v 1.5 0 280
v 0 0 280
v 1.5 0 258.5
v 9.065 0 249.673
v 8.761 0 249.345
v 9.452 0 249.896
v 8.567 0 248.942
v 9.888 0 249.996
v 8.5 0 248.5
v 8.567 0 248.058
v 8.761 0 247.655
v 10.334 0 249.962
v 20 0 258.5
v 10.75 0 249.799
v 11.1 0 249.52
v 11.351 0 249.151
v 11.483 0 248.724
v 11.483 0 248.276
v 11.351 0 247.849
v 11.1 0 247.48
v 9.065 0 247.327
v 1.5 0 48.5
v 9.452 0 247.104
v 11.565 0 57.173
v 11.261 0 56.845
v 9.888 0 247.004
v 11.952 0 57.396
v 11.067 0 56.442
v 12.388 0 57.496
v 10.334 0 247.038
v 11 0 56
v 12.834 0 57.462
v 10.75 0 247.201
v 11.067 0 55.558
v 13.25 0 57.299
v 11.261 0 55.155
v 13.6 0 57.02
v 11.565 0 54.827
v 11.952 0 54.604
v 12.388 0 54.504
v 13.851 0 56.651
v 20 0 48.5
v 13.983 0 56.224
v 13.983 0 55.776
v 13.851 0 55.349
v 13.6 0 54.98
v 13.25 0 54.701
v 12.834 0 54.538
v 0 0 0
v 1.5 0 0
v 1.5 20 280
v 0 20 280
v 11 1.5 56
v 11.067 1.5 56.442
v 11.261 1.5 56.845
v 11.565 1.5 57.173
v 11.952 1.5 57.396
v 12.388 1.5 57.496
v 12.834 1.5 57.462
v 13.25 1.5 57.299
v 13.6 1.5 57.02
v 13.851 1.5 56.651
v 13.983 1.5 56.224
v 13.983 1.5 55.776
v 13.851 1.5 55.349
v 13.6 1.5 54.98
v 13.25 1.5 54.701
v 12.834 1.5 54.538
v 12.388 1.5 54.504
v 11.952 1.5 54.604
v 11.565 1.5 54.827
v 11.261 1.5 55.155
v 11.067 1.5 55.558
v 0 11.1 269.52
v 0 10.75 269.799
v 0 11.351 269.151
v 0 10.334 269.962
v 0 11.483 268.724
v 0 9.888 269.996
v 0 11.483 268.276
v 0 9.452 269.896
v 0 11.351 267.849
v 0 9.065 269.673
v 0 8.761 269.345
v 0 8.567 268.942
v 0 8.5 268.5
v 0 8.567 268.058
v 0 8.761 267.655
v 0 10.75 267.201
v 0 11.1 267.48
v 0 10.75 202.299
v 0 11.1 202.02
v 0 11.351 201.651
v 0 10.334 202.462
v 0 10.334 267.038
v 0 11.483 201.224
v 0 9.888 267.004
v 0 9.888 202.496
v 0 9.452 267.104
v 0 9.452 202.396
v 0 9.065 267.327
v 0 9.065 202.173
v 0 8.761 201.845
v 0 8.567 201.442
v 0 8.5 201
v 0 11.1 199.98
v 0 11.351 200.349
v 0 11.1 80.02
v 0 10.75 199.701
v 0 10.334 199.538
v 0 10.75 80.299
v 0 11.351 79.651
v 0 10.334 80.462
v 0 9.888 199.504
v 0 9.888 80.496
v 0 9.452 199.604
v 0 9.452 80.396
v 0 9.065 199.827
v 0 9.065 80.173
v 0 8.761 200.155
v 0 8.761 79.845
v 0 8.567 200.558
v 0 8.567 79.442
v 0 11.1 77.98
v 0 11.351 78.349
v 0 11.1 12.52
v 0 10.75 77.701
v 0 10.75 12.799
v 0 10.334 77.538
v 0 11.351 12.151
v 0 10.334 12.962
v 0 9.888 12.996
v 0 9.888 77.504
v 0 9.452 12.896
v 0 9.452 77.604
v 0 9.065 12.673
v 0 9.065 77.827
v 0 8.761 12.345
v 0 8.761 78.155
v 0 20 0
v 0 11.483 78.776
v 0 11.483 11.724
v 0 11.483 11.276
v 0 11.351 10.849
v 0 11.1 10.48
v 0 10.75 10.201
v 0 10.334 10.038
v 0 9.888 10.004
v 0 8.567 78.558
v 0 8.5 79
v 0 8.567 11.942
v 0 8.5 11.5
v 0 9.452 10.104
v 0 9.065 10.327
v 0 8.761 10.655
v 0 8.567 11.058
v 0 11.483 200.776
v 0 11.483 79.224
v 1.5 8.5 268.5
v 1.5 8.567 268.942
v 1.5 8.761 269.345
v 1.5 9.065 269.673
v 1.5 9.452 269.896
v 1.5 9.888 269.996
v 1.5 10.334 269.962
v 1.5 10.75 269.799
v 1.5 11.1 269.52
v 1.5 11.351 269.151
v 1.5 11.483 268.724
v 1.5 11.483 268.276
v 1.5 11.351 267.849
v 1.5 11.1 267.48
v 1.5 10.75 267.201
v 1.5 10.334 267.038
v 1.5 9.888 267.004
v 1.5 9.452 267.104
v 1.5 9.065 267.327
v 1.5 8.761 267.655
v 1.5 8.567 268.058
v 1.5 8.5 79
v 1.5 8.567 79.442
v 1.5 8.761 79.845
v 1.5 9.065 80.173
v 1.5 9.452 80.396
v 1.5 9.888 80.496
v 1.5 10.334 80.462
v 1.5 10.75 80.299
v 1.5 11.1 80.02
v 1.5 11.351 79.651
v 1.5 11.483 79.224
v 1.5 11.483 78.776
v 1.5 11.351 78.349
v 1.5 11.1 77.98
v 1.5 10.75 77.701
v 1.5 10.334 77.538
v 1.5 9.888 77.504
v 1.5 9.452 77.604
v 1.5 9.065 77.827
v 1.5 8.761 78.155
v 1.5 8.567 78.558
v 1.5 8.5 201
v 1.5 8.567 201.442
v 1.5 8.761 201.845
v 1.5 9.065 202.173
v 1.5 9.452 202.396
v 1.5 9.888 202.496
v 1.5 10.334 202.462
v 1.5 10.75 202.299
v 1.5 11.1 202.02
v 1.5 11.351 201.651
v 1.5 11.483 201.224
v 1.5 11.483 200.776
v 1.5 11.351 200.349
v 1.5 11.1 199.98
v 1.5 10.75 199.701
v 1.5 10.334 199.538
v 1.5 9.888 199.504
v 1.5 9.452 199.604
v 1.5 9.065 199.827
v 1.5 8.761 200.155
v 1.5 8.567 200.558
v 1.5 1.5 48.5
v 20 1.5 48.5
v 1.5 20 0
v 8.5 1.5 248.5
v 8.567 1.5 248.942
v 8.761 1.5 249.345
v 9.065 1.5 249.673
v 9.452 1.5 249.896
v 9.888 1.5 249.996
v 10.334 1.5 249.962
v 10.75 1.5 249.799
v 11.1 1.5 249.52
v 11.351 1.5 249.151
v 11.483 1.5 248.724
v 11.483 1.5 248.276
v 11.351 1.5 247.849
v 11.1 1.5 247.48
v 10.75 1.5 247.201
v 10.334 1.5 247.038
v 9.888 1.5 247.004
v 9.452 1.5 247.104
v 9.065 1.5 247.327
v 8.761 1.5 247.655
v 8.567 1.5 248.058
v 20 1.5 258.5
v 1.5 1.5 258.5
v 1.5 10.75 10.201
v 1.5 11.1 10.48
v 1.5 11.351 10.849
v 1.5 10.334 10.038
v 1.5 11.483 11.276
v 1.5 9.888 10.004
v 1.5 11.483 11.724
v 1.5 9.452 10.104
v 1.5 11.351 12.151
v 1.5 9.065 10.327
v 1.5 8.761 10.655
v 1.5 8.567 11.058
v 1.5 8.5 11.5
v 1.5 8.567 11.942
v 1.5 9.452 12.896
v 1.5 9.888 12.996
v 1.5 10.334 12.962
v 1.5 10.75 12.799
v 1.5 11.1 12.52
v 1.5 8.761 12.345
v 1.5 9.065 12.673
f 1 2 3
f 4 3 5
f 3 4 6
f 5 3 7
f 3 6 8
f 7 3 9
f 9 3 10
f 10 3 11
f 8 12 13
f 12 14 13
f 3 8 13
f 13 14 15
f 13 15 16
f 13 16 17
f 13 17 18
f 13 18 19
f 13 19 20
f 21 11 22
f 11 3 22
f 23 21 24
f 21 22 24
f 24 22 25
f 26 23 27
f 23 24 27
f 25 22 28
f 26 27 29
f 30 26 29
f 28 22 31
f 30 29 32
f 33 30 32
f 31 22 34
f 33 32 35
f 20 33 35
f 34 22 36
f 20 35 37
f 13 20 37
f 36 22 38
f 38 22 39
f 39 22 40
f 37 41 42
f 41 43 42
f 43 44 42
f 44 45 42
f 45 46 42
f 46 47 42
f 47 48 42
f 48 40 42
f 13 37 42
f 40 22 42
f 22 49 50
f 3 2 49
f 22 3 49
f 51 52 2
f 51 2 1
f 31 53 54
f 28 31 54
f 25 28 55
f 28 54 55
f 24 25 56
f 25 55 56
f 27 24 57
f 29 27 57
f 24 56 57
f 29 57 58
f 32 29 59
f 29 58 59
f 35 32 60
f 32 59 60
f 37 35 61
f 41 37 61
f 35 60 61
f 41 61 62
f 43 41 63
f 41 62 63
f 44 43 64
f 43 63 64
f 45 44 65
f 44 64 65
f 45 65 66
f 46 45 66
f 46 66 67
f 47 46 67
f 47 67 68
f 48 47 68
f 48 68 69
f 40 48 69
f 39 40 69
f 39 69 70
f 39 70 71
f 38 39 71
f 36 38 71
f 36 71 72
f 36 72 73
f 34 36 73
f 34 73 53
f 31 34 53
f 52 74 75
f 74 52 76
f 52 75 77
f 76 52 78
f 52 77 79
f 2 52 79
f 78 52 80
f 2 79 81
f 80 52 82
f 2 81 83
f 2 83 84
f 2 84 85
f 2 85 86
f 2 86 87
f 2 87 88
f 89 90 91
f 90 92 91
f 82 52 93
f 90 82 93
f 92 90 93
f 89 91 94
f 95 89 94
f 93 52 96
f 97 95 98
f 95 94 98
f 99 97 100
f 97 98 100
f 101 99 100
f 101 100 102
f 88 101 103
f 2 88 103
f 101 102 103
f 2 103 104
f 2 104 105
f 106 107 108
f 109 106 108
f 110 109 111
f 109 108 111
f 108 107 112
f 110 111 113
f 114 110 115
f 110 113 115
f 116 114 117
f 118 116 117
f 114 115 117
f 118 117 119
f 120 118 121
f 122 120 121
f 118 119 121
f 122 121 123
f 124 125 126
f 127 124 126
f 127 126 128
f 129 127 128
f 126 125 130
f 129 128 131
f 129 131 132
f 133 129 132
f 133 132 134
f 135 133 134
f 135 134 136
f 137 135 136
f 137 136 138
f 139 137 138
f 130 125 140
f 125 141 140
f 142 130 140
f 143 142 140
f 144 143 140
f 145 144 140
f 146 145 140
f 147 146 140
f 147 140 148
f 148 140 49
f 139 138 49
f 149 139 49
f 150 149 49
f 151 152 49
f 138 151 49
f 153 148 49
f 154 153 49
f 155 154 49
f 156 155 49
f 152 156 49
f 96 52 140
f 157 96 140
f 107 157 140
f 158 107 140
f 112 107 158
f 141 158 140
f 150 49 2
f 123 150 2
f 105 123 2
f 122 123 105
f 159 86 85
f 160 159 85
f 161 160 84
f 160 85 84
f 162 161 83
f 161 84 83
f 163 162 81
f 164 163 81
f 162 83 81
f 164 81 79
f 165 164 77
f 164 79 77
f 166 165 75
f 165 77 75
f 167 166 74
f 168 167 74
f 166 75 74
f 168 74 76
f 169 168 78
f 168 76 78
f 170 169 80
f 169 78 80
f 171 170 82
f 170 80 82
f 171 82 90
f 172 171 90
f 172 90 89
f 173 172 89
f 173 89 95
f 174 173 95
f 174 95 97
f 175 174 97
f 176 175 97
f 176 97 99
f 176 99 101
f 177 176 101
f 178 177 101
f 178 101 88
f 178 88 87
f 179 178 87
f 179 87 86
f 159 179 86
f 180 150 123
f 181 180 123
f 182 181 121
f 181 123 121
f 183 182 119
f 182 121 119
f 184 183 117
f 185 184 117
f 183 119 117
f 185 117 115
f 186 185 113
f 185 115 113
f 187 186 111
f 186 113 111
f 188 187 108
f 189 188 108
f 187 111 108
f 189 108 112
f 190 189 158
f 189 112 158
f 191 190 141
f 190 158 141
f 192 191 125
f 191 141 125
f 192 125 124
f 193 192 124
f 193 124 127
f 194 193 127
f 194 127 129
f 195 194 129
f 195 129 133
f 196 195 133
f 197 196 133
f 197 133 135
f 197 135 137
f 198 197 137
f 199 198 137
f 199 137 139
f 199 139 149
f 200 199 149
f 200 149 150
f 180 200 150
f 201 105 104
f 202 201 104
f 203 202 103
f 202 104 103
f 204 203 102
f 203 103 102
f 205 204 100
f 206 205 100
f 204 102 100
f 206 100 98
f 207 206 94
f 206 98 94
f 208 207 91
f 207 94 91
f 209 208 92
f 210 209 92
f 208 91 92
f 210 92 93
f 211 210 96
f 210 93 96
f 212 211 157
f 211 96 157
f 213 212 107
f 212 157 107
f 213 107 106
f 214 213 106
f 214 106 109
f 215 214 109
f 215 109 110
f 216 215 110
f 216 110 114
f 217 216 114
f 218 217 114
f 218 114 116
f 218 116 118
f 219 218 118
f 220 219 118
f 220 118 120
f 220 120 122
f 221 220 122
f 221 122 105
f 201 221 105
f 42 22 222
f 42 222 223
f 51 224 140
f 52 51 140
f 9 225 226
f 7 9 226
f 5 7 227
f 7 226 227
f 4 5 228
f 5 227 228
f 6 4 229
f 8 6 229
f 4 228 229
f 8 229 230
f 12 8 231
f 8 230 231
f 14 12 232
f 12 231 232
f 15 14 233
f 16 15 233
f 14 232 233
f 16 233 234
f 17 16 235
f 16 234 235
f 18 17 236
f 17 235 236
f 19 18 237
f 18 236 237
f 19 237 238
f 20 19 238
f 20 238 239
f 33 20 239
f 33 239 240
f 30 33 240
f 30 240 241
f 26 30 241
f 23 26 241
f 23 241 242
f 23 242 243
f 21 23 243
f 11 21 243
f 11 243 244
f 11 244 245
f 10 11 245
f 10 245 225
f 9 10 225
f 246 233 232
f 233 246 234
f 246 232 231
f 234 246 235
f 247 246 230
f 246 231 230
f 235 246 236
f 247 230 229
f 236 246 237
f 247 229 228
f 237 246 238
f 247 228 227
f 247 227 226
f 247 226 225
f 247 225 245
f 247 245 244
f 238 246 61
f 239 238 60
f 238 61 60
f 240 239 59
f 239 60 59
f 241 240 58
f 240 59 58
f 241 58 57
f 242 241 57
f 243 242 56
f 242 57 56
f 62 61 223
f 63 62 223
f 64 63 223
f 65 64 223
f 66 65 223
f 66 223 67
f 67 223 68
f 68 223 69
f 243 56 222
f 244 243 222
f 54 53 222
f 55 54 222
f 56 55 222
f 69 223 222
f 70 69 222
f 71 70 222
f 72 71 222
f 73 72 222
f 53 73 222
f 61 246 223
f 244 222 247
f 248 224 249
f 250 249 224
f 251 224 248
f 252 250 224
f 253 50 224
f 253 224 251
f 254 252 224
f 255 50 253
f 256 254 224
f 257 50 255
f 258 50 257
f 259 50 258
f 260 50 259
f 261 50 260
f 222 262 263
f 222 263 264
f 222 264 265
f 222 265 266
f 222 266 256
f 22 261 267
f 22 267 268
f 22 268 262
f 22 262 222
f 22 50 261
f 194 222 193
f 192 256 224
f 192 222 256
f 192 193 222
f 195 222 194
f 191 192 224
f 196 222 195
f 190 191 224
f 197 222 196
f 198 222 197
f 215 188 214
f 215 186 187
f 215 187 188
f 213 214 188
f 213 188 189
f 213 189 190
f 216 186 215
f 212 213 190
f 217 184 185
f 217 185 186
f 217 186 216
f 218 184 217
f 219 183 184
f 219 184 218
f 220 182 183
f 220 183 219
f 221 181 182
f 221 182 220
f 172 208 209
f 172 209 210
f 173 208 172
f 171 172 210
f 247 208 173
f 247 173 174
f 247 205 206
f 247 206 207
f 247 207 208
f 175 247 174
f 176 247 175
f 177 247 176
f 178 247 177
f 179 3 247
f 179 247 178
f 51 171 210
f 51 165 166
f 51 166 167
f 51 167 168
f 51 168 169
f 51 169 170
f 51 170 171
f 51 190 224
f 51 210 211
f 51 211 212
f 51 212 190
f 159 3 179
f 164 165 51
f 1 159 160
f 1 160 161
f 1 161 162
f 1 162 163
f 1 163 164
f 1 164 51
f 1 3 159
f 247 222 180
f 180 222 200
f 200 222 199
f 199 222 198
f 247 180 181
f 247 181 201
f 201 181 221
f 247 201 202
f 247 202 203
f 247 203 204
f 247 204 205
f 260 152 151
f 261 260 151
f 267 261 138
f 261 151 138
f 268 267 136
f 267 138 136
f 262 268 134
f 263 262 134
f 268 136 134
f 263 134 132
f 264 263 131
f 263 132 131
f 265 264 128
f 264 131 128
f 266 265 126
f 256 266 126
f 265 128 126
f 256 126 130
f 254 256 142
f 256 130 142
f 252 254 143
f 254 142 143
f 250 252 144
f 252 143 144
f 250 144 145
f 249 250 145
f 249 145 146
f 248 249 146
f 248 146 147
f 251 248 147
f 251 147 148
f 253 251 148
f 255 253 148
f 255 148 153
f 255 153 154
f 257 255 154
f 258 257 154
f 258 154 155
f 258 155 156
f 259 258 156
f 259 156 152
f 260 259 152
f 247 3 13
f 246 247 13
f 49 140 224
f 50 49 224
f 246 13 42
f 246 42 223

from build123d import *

# Parameters (mm, degrees)
EXTRUSION1_DEPTH = 280
ESQUISSE2_R      = 1.5
EXTRUSION2_DEPTH = 282.322324034
ESQUISSE3_R      = 1.5
EXTRUSION3_DEPTH = 10
ESQUISSE4_W      = 18.5
ESQUISSE4_H      = 48.5
ESQUISSE4_H_2    = 21.5
EXTRUSION4_DEPTH = 1.5


with BuildPart() as part:
    # Esquisse1 → Extrusion1 (new body)
    with BuildSketch(Plane.XY):
        Polygon((0, 0), (20, 0), (20, 1.5), (1.5, 1.5), (1.5, 20), (0, 20), align=None)
    extrude(amount=EXTRUSION1_DEPTH)

    # Esquisse2 → Extrusion2 (cut, through all)
    with BuildSketch(Plane(origin=(0, 1.5, 0), x_dir=(1, 0, 0), z_dir=(0, 1, 0))):
        with Locations(Location((12.5, -56, 0), (0, 0, 180))):
            Circle(ESQUISSE2_R)
        with Locations(Location((10, -248.5, 0), (0, 0, 180))):
            Circle(ESQUISSE2_R)
    extrude(amount=-EXTRUSION2_DEPTH, mode=Mode.SUBTRACT)

    # Esquisse3 → Extrusion3 (cut)
    with BuildSketch(Plane.ZY):
        with Locations(Location((268.5, 10, 0), (0, 0, 270))):
            Circle(ESQUISSE3_R)
        with Locations(Location((11.5, 10, 0), (0, 0, 270))):
            Circle(ESQUISSE3_R)
        with Locations(Location((79, 10, 0), (0, 0, 270))):
            Circle(ESQUISSE3_R)
        with Locations(Location((201, 10, 0), (0, 0, 270))):
            Circle(ESQUISSE3_R)
    extrude(amount=-EXTRUSION3_DEPTH, mode=Mode.SUBTRACT)

    # Esquisse4 → Extrusion4 (cut)
    with BuildSketch(Plane.XZ):
        with Locations((10.75, 24.25)):
            Rectangle(ESQUISSE4_W, ESQUISSE4_H)
        with Locations((10.75, 269.25)):
            Rectangle(ESQUISSE4_W, ESQUISSE4_H_2)
    extrude(amount=-EXTRUSION4_DEPTH, mode=Mode.SUBTRACT)


solid = part.part
